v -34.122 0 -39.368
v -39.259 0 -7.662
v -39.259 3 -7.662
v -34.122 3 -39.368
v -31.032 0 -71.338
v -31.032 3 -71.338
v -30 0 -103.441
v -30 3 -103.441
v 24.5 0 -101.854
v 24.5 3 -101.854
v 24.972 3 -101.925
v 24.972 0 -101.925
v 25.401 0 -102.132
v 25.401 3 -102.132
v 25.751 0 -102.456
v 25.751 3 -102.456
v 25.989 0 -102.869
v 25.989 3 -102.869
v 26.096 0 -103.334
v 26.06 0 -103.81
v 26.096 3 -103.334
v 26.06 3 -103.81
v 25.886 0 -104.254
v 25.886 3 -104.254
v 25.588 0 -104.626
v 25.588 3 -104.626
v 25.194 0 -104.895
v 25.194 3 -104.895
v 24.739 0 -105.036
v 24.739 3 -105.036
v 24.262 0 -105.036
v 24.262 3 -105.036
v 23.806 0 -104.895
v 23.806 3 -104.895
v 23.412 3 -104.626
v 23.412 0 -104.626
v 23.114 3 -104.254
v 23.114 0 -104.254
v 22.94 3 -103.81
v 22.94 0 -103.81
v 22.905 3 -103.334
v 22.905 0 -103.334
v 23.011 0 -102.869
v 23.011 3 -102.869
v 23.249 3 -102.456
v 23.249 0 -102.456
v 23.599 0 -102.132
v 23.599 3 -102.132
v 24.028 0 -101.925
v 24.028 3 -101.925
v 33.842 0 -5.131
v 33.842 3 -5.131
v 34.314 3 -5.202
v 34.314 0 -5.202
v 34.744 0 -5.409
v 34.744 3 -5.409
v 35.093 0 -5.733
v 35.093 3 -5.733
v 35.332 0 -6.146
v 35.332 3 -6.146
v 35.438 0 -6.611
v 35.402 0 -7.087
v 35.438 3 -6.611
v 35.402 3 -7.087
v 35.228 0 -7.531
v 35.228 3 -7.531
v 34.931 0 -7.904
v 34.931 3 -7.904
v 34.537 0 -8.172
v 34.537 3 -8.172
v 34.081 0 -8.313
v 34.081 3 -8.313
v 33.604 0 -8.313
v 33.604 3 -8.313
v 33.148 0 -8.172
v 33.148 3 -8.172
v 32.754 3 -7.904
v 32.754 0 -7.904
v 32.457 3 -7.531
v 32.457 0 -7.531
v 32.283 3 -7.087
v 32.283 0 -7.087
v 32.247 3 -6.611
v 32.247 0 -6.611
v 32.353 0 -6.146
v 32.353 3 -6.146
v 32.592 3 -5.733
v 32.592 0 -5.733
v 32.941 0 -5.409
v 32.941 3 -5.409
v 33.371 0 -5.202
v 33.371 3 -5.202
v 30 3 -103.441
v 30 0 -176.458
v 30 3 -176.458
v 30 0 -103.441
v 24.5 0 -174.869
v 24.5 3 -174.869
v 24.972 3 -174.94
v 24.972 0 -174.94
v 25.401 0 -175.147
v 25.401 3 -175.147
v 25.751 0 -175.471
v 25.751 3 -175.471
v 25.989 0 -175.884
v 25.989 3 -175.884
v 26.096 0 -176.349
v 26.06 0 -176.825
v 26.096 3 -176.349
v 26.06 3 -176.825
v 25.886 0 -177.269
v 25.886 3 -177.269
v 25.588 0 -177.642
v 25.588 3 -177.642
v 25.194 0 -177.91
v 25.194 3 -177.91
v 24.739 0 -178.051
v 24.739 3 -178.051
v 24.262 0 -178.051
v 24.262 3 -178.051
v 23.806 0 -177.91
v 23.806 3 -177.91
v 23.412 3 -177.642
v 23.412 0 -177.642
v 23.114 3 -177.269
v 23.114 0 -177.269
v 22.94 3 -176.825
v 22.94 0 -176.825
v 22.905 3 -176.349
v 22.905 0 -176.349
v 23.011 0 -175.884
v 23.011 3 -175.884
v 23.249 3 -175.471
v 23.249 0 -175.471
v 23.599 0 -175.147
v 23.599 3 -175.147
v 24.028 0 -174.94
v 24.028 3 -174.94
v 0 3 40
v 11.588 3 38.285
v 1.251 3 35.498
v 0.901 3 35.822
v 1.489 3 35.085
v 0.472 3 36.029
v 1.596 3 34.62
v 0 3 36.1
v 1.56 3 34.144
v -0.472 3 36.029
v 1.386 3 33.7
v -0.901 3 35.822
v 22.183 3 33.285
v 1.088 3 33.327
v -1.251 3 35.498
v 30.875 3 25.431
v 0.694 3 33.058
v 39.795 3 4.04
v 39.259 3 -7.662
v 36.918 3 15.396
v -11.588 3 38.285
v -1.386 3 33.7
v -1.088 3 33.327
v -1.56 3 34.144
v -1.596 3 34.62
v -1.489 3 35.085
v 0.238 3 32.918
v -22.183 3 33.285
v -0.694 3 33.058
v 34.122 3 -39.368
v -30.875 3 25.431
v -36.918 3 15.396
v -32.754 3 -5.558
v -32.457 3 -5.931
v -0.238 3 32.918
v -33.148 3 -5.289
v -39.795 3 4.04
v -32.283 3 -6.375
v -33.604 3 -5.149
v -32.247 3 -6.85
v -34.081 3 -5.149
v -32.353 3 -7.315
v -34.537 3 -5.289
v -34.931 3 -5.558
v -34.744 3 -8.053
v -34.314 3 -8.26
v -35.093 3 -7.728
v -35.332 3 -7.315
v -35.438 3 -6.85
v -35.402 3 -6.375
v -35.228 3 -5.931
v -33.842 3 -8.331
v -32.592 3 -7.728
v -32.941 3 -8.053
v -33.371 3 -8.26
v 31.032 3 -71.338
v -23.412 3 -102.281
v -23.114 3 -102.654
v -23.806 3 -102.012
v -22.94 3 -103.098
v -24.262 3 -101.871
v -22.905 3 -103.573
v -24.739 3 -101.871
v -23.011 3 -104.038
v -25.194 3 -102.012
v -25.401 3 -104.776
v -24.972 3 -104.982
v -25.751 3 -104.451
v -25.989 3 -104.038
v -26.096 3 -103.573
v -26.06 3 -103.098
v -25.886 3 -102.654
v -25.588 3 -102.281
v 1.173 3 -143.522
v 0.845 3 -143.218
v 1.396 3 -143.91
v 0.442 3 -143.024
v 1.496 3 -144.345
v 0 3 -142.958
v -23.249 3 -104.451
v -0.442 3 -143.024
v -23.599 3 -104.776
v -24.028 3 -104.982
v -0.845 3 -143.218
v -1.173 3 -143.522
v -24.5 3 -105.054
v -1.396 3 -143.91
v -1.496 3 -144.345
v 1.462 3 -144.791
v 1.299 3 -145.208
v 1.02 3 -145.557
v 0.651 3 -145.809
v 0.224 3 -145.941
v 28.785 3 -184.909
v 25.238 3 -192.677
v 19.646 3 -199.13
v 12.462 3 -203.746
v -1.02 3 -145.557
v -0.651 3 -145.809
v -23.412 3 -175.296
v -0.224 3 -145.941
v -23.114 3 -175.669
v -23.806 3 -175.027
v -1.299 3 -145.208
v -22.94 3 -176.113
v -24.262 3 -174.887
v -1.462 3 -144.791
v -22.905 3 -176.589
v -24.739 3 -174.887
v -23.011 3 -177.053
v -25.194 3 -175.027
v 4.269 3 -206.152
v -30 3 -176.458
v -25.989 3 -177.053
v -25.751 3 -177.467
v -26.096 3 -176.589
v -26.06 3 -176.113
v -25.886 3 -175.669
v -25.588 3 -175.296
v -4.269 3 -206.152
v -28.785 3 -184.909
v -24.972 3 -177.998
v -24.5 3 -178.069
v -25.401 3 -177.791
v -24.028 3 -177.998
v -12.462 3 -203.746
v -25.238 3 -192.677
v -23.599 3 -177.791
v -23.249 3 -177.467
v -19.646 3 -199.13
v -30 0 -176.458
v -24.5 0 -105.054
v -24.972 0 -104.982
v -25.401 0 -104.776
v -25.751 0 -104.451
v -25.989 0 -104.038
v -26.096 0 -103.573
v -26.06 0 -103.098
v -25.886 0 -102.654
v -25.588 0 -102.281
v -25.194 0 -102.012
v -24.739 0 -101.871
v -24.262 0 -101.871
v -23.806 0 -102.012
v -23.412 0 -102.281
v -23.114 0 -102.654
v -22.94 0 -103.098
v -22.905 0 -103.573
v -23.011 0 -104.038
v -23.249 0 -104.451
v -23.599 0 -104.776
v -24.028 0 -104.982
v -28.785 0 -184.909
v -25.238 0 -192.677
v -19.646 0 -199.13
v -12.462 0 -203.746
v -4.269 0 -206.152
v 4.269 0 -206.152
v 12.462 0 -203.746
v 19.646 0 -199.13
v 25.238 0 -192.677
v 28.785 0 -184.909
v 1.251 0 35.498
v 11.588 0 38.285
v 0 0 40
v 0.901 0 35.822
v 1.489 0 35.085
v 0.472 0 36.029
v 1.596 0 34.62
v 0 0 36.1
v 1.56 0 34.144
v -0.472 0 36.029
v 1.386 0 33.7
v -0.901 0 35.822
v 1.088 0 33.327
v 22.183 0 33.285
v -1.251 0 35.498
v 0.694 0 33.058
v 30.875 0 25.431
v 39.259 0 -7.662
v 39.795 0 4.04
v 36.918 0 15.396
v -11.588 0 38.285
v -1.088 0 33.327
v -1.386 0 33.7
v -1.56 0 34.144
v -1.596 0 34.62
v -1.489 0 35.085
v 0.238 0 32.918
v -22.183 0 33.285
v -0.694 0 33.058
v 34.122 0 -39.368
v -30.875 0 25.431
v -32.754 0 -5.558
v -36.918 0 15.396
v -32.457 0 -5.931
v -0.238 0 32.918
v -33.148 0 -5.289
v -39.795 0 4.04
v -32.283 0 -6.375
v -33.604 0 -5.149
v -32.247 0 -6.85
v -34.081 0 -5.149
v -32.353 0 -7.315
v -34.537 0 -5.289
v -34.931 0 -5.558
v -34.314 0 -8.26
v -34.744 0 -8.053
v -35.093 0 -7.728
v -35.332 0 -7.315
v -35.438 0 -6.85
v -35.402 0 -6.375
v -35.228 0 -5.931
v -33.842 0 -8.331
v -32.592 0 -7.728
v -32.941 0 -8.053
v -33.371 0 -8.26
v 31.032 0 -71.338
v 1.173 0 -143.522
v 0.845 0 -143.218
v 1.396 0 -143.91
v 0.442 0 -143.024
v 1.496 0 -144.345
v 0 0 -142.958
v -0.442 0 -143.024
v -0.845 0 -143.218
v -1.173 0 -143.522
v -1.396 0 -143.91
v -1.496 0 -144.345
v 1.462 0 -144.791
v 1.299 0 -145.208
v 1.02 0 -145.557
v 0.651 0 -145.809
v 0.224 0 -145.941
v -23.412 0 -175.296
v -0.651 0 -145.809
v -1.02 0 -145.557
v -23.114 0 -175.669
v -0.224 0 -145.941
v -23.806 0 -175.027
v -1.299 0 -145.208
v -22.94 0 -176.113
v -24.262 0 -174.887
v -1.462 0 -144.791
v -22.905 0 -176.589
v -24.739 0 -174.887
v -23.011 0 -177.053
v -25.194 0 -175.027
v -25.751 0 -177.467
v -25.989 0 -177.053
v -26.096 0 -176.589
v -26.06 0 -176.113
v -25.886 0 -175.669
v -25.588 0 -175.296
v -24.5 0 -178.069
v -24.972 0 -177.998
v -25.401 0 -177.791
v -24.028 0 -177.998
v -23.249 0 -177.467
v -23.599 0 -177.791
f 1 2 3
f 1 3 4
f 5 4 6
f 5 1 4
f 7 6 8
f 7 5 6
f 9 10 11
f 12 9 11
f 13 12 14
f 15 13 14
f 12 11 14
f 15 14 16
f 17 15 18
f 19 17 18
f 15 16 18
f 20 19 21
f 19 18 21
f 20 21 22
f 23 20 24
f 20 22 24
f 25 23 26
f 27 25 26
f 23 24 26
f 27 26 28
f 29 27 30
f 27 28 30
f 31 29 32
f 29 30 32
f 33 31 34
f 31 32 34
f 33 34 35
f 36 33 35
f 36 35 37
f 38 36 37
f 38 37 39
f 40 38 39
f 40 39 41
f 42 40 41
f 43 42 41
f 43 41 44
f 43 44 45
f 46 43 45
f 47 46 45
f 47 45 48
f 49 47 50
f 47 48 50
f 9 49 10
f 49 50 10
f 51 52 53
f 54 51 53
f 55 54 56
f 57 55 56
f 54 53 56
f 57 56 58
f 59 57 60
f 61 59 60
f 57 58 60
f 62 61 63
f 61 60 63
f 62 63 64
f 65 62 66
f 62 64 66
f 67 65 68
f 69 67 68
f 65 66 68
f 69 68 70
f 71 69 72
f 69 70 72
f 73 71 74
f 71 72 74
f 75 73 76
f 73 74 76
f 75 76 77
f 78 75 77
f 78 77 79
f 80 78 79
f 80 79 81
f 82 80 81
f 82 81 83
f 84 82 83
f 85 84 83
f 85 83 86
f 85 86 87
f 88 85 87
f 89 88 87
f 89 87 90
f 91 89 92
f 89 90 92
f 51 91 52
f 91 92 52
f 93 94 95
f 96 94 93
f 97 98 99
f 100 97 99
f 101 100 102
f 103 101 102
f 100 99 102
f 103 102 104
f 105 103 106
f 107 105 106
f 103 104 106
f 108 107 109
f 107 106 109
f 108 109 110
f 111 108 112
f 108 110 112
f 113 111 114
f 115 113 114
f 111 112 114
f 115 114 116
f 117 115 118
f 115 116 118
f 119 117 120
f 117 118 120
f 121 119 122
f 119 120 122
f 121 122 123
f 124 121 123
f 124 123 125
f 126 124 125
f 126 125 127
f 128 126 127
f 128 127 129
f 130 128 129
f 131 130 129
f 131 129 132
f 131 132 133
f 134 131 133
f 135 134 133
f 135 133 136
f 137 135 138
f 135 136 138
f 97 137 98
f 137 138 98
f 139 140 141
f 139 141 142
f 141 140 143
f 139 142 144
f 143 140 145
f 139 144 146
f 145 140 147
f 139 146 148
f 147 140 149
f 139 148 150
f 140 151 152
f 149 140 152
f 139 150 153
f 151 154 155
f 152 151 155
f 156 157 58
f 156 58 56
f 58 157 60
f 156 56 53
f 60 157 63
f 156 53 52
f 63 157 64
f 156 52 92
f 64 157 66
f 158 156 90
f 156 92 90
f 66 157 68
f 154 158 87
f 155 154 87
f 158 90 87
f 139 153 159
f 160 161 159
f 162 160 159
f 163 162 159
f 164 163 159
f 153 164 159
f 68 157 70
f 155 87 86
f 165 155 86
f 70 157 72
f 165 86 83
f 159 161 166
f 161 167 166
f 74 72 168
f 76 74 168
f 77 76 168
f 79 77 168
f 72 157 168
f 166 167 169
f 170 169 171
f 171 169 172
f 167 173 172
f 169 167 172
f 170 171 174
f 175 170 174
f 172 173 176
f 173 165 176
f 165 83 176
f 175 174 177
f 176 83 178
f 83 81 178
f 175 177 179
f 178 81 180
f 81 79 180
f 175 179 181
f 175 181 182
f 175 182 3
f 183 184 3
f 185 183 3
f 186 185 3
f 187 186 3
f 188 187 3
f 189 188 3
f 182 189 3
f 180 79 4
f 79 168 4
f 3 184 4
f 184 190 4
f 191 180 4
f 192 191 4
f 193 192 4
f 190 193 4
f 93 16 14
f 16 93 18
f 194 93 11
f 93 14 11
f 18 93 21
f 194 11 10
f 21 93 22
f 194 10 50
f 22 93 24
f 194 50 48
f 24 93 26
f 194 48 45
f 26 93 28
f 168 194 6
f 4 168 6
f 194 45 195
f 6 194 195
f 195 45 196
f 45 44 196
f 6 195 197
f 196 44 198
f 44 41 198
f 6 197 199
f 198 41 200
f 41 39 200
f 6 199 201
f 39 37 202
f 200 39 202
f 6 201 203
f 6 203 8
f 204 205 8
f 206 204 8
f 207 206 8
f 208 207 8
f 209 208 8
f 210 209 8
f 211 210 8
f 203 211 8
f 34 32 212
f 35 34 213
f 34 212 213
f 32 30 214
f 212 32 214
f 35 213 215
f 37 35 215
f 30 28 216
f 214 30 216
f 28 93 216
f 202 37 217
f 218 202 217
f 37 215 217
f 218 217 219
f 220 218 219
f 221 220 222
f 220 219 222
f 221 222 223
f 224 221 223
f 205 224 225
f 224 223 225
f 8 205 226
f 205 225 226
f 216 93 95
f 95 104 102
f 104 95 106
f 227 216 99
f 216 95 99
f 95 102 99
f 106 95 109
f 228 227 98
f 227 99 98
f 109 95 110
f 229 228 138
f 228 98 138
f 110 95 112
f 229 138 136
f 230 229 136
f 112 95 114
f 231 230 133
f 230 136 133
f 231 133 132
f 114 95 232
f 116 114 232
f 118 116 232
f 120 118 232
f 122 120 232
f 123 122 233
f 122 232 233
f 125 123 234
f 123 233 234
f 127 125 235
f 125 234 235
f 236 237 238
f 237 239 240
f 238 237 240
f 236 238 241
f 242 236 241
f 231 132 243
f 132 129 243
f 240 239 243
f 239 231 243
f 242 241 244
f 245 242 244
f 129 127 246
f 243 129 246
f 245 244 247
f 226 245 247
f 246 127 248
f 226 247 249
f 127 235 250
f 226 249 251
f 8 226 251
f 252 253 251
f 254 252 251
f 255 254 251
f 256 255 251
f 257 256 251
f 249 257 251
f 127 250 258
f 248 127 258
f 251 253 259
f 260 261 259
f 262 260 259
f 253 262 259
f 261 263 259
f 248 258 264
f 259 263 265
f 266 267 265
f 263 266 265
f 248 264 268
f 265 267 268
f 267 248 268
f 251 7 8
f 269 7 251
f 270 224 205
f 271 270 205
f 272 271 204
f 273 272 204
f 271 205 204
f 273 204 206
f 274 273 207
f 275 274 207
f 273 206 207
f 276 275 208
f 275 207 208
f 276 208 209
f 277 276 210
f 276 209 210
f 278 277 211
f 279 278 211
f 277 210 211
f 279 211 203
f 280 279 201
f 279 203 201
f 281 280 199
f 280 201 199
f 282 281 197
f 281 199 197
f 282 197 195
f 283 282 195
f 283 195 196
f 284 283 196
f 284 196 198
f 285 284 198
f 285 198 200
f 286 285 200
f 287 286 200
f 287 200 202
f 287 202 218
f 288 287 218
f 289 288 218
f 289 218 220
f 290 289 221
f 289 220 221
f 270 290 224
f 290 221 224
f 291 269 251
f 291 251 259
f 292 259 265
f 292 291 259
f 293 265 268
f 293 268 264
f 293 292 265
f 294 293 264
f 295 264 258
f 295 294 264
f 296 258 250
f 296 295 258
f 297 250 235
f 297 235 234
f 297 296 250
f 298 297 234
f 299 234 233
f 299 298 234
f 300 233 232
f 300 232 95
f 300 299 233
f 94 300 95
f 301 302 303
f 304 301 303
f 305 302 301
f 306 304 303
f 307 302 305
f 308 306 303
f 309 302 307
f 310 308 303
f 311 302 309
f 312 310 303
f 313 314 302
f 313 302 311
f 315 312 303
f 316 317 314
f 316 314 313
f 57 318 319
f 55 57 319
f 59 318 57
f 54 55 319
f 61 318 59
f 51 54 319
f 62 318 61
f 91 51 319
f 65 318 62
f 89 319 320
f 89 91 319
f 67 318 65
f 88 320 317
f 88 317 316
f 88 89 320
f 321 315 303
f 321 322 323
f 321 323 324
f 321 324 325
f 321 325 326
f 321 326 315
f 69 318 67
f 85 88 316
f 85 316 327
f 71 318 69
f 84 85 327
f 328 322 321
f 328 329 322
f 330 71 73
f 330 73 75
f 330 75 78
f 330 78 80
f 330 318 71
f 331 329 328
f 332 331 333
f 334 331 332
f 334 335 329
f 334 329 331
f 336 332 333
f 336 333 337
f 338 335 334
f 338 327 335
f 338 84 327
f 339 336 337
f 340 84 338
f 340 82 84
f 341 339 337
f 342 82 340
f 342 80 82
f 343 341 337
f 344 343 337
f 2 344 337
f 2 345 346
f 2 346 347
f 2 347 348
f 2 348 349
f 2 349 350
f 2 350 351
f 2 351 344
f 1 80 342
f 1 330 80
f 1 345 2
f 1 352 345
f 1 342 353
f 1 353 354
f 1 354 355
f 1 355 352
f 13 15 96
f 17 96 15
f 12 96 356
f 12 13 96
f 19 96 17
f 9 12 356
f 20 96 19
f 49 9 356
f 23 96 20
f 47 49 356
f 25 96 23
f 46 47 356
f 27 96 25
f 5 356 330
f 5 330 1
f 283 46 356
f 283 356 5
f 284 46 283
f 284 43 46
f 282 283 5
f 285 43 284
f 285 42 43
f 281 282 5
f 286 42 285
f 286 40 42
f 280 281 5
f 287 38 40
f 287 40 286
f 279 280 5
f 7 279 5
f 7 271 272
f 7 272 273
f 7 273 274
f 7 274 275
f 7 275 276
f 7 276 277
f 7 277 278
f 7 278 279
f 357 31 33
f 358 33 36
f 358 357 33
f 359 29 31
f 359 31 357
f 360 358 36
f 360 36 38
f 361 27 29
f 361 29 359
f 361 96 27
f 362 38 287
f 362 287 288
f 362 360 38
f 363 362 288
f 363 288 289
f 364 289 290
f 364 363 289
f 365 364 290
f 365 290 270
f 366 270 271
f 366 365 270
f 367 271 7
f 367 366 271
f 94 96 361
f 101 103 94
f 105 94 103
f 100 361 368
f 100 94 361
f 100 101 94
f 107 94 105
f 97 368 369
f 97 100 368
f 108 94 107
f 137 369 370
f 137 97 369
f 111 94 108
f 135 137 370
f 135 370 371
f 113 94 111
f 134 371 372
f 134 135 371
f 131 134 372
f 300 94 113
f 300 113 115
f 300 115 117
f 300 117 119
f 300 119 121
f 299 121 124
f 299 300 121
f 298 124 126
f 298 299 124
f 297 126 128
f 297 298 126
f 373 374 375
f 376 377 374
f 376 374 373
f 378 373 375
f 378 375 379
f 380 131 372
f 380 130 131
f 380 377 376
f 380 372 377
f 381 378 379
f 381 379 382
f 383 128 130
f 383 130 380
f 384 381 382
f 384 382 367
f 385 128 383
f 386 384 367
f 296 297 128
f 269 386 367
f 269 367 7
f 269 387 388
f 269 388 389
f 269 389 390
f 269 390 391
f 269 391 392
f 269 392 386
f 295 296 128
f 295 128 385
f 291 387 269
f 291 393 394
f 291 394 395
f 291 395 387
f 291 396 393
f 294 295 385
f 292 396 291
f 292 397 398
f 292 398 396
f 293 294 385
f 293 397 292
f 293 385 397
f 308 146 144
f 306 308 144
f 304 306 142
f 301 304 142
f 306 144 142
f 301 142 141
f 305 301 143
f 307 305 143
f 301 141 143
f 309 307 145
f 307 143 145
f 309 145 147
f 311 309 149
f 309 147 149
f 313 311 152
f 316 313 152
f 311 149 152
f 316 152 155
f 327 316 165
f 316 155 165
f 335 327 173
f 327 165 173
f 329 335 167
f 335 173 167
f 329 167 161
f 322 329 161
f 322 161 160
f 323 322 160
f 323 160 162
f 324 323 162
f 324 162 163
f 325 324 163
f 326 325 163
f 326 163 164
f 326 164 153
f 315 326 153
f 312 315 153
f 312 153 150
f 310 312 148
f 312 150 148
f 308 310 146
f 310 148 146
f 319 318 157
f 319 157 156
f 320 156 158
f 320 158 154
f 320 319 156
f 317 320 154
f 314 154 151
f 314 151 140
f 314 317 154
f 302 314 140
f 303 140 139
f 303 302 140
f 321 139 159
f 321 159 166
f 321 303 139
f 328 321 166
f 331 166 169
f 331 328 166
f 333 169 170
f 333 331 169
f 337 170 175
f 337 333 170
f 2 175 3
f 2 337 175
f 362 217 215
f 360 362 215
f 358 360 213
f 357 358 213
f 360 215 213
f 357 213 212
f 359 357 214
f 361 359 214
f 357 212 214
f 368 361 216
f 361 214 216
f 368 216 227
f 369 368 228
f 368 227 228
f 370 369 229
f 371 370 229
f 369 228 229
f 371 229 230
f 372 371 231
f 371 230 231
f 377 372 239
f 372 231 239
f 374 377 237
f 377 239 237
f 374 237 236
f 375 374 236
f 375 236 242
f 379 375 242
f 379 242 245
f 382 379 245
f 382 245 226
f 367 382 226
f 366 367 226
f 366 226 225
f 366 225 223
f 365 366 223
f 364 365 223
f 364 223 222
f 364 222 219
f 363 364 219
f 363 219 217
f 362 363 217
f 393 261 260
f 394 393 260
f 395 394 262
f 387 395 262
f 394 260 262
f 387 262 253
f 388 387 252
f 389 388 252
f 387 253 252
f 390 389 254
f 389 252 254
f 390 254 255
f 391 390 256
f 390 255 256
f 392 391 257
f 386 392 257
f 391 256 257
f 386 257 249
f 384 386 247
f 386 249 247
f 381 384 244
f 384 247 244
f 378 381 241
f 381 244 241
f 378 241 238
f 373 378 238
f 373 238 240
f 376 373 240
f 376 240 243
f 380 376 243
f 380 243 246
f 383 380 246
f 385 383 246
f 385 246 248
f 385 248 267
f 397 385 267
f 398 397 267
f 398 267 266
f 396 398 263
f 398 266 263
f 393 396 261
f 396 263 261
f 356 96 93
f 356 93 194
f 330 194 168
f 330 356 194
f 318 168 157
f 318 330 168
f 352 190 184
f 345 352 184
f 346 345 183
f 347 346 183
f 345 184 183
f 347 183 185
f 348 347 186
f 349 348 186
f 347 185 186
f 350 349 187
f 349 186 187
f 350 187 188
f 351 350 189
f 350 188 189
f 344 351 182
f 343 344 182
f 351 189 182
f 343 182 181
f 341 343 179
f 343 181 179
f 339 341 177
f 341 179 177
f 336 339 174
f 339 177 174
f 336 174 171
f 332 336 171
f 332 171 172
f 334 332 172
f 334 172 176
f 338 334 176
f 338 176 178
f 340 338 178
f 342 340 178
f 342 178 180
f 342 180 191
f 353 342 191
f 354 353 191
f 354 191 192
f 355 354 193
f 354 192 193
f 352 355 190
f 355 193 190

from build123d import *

# Parameters (mm, degrees)
EXTRUDE_1_DEPTH     = 3
SKETCH_2_R          = 1.6
CUT_EXTRUDE_1_DEPTH = 3
SKETCH_3_R          = 1.5
CUT_EXTRUDE_2_DEPTH = 10


with BuildPart() as part:
    # 草图1 → 凸台-拉伸1 (new body)
    with BuildSketch(Plane(origin=(0, 0, 0), x_dir=(1, 0, 0), z_dir=(0, 1, 0))):
        with BuildLine():
            Line((30, 176.457513111), (30, 103.440804328))
            ThreePointArc((30, 103.440804328), (32.320198134, 55.328281895), (39.259259259, 7.662281802))
            ThreePointArc((39.259259259, 7.662281802), (0, -40), (-39.259259259, 7.662281802))
            ThreePointArc((-39.259259259, 7.662281802), (-32.320198134, 55.328281895), (-30, 103.440804328))
            Line((-30, 103.440804328), (-30, 176.457513111))
            ThreePointArc((-30, 176.457513111), (0, 206.457513111), (30, 176.457513111))
        make_face()
    extrude(amount=EXTRUDE_1_DEPTH)

    # 草图2 → 切除-拉伸1 (cut)
    with BuildSketch(Plane(origin=(0, 3, 0), x_dir=(1, 0, 0), z_dir=(0, 1, 0))):
        with Locations(Location((0, -34.5, 0), (0, 0, 270))):
            Circle(SKETCH_2_R)
        with Locations(Location((33.842463041, 6.730809037, 0), (0, 0, 270))):
            Circle(SKETCH_2_R)
        with Locations(Location((24.500054413, 103.453580765, 0), (0, 0, 270))):
            Circle(SKETCH_2_R)
        with Locations(Location((24.500043559, 176.468944491, 0), (0, 0, 270))):
            Circle(SKETCH_2_R)
        with Locations(Location((-24.500043559, 176.468944491, 0), (0, 0, 90))):
            Circle(SKETCH_2_R)
        with Locations(Location((-24.500054413, 103.453580765, 0), (0, 0, 90))):
            Circle(SKETCH_2_R)
        with Locations(Location((-33.842463041, 6.730809037, 0), (0, 0, 90))):
            Circle(SKETCH_2_R)
    extrude(amount=-CUT_EXTRUDE_1_DEPTH, mode=Mode.SUBTRACT)

    # 草图3 → 切除-拉伸2 (cut)
    with BuildSketch(Plane(origin=(0, 3, 0), x_dir=(1, 0, 0), z_dir=(0, 1, 0))):
        with Locations(Location((0, 144.457513111, 0), (0, 0, 270))):
            Circle(SKETCH_3_R)
    extrude(amount=-CUT_EXTRUDE_2_DEPTH, mode=Mode.SUBTRACT)


solid = part.part
